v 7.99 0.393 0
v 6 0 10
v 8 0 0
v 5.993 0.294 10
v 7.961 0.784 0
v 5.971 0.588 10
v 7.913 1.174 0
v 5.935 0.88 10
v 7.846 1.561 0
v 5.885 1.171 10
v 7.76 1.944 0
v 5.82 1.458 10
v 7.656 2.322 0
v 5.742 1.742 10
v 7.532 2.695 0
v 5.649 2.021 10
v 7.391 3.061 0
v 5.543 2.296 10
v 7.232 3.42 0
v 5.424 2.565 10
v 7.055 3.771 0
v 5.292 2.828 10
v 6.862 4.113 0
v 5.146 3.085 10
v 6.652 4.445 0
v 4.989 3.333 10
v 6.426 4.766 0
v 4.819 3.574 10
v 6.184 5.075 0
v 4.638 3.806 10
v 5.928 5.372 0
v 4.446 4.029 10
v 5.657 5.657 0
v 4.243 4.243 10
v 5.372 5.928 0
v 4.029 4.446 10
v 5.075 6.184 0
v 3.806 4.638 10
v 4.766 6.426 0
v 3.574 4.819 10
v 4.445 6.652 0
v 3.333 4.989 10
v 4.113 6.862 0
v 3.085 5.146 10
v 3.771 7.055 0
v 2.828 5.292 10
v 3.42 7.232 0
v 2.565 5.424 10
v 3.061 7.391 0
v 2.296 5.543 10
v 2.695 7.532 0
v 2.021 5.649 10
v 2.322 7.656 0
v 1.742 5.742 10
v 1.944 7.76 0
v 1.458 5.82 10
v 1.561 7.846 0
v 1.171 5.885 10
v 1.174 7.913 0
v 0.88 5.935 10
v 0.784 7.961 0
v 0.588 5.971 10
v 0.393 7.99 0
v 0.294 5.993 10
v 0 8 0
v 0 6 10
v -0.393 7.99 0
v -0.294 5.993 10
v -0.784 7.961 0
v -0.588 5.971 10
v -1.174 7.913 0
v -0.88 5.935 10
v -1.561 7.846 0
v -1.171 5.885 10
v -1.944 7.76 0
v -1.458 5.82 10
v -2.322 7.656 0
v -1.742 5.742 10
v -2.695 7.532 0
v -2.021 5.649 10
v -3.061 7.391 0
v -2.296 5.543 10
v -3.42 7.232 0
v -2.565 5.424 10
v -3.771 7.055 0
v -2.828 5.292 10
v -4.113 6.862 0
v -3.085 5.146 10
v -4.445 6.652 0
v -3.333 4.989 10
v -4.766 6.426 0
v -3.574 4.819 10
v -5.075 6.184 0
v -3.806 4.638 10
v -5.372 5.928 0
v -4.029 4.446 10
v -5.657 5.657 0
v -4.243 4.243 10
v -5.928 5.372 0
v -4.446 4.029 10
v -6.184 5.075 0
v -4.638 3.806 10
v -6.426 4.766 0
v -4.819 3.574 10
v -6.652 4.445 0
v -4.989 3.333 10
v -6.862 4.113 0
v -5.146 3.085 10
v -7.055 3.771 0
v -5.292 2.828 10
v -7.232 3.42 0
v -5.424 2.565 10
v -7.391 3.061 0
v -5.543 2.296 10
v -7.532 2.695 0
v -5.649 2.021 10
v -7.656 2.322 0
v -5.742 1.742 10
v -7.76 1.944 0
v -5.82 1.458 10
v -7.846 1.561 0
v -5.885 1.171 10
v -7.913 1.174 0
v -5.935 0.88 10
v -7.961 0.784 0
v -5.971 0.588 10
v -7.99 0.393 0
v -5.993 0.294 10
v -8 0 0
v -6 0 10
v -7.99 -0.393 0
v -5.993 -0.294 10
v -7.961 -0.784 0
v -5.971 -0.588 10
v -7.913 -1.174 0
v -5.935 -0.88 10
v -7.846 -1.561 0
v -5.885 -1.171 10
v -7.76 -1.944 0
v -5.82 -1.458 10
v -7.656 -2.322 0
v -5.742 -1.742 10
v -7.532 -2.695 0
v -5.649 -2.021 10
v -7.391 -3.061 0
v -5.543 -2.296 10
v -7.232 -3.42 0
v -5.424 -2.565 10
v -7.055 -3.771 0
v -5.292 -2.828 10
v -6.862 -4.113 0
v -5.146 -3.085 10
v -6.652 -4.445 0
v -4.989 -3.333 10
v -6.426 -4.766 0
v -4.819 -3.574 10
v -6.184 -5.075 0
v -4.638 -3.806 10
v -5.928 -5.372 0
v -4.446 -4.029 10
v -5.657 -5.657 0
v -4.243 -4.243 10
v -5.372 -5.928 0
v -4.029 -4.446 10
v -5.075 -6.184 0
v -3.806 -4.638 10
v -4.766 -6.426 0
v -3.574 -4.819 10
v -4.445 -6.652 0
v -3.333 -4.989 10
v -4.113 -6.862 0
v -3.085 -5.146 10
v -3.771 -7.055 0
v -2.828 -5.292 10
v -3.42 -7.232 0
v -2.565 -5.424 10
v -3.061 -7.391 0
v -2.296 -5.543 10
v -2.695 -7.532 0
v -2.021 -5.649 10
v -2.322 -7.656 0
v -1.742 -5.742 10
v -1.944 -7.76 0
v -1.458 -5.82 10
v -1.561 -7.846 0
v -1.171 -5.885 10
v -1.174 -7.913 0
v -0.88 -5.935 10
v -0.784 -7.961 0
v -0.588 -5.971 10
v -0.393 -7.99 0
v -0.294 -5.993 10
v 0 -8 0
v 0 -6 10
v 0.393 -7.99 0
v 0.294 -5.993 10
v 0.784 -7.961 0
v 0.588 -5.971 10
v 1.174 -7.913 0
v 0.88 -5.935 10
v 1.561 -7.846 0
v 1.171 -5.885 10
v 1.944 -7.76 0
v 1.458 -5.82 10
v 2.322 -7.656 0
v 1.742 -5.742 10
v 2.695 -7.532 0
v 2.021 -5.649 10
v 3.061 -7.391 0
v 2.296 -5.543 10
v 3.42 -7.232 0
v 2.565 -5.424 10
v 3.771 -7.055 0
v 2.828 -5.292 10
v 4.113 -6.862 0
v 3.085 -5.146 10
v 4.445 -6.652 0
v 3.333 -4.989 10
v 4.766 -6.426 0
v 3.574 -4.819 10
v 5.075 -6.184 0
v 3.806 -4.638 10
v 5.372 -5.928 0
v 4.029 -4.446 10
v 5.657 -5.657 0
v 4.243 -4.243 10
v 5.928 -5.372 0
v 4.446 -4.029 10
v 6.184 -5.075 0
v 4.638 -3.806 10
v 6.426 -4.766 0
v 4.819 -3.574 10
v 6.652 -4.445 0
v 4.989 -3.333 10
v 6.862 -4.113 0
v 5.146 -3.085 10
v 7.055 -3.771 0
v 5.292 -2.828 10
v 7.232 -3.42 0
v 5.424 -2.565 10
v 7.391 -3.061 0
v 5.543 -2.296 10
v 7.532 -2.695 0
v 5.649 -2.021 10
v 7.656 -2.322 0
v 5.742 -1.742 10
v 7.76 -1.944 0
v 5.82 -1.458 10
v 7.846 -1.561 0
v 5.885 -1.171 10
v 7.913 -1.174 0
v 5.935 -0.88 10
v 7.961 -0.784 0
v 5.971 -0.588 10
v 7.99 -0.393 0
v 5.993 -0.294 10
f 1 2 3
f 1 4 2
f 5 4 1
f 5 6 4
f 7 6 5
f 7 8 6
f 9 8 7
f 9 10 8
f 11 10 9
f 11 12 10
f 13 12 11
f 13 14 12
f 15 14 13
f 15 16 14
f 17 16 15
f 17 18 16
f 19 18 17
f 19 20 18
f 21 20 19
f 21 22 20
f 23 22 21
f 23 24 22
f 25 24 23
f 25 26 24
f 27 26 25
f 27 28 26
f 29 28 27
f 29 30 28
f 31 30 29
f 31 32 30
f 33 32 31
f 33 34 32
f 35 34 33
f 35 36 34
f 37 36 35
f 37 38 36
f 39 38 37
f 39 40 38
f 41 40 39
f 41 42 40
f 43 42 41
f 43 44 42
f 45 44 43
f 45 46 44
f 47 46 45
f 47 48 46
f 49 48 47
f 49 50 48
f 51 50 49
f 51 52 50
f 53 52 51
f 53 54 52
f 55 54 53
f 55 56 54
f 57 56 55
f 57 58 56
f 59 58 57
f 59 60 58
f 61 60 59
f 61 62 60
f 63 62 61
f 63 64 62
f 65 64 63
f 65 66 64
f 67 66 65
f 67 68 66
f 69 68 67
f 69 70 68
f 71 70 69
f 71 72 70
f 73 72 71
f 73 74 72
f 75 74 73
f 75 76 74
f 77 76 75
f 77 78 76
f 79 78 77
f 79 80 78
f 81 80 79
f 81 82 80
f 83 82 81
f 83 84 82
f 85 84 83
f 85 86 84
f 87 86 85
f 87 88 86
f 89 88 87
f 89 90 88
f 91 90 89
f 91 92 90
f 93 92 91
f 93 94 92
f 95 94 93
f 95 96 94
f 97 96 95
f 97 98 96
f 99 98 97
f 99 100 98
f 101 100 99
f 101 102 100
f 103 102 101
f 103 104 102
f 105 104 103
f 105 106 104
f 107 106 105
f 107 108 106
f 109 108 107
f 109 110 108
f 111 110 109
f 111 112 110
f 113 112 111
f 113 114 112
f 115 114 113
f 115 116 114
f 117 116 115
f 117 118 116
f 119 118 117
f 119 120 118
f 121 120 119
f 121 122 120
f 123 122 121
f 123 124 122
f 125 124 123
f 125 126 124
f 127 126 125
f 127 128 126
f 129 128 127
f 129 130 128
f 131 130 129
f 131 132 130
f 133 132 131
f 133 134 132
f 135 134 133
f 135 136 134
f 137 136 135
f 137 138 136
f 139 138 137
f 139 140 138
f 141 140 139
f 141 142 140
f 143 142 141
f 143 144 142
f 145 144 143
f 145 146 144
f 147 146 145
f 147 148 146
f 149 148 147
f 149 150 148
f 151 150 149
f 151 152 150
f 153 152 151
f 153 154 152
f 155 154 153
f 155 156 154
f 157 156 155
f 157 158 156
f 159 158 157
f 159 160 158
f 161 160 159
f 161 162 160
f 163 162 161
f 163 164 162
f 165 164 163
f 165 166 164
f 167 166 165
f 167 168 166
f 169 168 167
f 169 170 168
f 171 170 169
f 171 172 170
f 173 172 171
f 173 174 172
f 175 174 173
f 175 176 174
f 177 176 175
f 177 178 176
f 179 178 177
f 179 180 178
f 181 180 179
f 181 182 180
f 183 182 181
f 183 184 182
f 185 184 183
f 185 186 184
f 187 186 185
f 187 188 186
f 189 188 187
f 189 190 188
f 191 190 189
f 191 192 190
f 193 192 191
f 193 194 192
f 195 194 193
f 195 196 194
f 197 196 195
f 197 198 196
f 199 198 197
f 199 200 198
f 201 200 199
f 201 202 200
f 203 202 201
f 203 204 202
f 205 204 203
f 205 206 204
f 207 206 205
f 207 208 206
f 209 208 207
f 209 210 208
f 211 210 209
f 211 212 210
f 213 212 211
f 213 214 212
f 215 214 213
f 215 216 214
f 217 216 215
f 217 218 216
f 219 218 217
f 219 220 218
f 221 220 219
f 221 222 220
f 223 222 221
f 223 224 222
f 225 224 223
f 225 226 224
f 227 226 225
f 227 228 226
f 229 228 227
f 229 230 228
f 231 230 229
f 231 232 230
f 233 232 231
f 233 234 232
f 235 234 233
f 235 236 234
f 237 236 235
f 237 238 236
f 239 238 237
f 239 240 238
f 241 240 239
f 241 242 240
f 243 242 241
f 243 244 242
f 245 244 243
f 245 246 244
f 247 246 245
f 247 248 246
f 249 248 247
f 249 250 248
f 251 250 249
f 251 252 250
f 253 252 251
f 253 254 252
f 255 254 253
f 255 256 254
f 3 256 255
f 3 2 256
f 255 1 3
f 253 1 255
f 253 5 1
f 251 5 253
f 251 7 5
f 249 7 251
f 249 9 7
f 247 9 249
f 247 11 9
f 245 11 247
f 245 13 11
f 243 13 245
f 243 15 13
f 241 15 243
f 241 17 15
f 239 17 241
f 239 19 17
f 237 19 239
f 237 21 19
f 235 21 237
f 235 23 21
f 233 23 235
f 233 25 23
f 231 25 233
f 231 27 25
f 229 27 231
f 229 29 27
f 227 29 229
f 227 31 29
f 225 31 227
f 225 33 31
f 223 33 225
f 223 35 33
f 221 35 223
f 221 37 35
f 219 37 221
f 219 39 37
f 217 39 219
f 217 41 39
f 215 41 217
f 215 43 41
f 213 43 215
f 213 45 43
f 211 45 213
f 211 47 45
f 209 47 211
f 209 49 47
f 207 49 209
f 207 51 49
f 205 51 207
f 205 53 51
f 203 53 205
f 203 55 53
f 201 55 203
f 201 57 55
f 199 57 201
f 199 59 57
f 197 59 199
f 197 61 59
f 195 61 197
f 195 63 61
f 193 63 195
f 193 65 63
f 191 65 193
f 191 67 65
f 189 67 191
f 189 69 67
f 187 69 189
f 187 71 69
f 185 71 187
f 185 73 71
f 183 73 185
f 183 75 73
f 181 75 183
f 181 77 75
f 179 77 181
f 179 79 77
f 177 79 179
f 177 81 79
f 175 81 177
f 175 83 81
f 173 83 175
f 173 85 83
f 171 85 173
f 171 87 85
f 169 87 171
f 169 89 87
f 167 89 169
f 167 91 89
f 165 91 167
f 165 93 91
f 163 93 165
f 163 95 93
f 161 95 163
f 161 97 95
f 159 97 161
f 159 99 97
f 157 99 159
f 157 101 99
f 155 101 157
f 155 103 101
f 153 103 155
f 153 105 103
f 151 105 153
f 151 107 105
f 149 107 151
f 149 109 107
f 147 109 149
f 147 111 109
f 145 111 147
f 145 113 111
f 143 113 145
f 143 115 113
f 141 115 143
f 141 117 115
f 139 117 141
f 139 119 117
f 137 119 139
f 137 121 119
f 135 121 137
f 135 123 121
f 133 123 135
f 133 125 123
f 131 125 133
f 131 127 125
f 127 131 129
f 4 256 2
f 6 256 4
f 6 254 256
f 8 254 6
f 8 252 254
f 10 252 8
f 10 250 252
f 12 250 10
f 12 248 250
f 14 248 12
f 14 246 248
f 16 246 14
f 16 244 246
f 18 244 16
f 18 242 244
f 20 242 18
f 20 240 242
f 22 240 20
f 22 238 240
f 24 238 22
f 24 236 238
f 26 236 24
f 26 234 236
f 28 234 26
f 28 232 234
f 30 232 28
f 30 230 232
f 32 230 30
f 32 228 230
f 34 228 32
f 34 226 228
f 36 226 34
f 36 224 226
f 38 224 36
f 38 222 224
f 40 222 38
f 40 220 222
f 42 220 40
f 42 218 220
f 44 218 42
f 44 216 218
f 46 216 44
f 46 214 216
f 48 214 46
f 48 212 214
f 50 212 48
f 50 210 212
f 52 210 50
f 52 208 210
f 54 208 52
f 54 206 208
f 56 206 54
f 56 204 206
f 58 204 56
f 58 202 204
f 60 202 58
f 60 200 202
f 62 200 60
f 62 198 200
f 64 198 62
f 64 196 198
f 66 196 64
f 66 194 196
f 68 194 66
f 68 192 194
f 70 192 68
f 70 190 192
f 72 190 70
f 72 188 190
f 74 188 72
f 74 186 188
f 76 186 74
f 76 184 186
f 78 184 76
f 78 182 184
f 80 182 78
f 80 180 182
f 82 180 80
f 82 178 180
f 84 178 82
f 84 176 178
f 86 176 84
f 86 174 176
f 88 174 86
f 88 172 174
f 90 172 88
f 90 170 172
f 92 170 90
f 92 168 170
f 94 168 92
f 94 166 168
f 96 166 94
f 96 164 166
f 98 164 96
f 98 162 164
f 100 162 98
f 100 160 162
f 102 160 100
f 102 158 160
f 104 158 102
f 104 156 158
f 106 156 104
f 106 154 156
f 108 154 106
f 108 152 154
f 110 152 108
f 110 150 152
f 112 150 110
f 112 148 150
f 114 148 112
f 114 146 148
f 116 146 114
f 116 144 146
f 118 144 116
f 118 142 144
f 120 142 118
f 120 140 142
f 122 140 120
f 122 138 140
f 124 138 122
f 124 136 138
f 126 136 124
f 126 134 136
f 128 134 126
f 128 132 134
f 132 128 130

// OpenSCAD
// Auto-generated from tests/data/feature_fixtures_manifest.json
// fixture: cone_shallow
// fixture_type: cone
// description: Shallow frustum (r1=8, r2=6, h=10); near-cylinder negative-class guard.
$fn = 96;

radius1 = 8.000000;
radius2 = 6.000000;
height = 10.000000;

cylinder(r1=radius1, r2=radius2, h=height, $fn=128);
